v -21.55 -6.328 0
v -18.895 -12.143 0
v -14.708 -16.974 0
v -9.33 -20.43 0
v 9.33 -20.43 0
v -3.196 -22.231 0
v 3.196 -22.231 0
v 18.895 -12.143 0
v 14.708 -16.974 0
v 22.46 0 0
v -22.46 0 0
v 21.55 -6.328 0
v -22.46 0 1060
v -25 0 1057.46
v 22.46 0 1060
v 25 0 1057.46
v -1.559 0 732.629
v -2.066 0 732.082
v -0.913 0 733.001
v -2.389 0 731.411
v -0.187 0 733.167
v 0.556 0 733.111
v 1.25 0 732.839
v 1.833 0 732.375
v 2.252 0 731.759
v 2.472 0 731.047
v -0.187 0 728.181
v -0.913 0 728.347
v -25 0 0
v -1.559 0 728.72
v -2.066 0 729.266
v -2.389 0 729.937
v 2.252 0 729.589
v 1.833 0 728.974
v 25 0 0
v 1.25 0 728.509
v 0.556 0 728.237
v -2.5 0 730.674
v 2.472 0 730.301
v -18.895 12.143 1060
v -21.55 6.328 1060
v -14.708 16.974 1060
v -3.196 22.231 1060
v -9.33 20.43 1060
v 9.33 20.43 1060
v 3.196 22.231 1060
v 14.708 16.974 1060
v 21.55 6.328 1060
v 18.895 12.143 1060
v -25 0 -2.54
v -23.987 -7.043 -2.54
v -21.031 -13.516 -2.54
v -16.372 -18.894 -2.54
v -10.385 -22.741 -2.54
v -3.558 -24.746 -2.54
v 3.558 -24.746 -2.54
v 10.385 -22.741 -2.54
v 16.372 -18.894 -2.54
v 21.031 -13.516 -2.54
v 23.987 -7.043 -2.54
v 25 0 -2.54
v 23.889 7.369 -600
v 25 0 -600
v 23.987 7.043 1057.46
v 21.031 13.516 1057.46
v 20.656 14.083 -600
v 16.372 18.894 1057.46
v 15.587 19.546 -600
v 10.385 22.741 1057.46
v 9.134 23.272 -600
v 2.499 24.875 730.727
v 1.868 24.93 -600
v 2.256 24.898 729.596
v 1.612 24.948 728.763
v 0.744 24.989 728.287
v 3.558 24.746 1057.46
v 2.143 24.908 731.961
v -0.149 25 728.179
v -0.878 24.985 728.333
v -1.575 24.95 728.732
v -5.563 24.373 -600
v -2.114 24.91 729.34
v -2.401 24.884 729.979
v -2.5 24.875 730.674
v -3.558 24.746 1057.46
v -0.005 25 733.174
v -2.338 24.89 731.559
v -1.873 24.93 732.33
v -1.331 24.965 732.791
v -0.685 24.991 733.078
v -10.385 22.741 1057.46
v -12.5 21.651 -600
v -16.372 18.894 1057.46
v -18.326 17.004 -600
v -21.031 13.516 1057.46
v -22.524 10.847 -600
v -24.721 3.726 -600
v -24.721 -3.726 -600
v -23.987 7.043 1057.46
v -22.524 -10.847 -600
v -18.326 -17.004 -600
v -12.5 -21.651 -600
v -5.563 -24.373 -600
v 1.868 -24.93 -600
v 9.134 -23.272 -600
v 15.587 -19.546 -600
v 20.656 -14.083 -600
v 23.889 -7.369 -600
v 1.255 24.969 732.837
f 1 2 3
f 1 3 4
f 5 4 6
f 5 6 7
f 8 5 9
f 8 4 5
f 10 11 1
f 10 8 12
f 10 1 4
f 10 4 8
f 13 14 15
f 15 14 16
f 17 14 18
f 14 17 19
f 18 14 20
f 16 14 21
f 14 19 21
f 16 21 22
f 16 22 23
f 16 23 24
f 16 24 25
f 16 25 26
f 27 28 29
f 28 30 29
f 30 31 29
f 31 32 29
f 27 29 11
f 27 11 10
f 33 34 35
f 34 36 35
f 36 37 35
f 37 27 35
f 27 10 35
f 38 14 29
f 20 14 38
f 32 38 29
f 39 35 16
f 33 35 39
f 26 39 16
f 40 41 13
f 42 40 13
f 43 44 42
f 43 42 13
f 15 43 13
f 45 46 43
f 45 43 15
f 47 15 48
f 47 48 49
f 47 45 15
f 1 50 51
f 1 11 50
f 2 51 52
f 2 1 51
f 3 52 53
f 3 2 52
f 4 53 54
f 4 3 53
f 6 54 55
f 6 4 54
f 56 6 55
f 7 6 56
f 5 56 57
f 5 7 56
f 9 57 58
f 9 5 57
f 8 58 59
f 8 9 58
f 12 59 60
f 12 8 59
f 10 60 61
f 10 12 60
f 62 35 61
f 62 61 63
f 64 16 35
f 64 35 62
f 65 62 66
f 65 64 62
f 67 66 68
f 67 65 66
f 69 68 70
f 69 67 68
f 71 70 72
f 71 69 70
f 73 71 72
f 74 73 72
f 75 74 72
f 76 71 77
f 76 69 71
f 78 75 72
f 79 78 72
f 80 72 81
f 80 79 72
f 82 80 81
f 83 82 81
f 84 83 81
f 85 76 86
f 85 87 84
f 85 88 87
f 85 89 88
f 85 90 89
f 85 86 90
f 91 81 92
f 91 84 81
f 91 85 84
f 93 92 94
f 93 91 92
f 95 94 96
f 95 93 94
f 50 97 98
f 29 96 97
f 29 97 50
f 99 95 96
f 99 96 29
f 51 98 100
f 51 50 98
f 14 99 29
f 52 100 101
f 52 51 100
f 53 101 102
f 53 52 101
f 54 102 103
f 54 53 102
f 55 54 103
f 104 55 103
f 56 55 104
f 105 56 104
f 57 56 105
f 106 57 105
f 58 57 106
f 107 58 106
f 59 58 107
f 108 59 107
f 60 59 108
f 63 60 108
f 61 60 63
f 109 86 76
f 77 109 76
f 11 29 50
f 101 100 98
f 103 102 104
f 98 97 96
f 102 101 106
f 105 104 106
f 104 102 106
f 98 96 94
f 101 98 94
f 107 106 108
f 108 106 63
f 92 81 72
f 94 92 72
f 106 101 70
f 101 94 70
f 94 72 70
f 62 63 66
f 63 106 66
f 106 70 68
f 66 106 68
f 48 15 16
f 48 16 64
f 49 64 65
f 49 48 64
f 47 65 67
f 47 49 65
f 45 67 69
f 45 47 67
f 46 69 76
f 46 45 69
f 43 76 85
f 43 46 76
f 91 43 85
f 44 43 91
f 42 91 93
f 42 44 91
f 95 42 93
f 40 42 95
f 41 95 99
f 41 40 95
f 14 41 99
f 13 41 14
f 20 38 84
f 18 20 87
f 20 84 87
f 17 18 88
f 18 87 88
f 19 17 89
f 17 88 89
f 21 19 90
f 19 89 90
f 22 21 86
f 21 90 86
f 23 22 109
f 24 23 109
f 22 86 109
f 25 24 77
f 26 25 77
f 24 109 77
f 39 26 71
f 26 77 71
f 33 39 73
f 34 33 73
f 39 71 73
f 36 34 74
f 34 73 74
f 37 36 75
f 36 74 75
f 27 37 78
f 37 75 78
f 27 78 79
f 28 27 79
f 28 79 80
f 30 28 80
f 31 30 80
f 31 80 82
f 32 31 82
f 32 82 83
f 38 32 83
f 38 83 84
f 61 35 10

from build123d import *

# Parameters (mm, degrees)
F1_DEPTH    = 1060
F2_DEPTH    = 600
F3_T2_ANGLE = 180
F4_SIZE     = 2.54
F6_D        = 5


# Not quite as in the source:
# - a fillet or chamfer that OpenCascade refuses, or shapes differently, is made with other operations: its cross-section is extruded or revolved along the edge and cut away or added


with BuildPart() as f1:
    # F0 (on Top) → F1 (new body)
    with BuildSketch(Plane.XY):
        with BuildLine():
            Line((-25, 0), (25, 0))
            ThreePointArc((25, 0), (0, 25), (-25, 0))
        make_face()
    extrude(amount=F1_DEPTH)

    # F0 (on Top) → F2 (join)
    with BuildSketch(Plane.XY):
        with BuildLine():
            ThreePointArc((-25, 0), (0, -25), (25, 0))
            Line((25, 0), (-25, 0))
        make_face()
        with BuildLine():
            Line((-25, 0), (25, 0))
            ThreePointArc((25, 0), (0, 25), (-25, 0))
        make_face()
    extrude(amount=-F2_DEPTH)

    # F3: chamfer of 2.54 on 1 edges, made by hand

    # F3_s1 → F3_t2 (revolve, cut)
    with BuildSketch(Plane.XZ):
        Polygon((-25, -2.54), (-22.46, 0), (-25, 0), align=None)
    revolve(axis=Axis((0, 0, 0), (0, 0, 1)), revolution_arc=F3_T2_ANGLE, mode=Mode.SUBTRACT)

    # F4
    f4_edges = [f1.edges().sort_by_distance(p)[0] for p in [
        (0, 25, 1060),
    ]]
    chamfer(f4_edges, length=F4_SIZE)

    # F6 (through all)
    with Locations(Plane.XZ):
        with Locations((0, 730.6740903854)):
            Hole(F6_D / 2)


solid = f1.part
